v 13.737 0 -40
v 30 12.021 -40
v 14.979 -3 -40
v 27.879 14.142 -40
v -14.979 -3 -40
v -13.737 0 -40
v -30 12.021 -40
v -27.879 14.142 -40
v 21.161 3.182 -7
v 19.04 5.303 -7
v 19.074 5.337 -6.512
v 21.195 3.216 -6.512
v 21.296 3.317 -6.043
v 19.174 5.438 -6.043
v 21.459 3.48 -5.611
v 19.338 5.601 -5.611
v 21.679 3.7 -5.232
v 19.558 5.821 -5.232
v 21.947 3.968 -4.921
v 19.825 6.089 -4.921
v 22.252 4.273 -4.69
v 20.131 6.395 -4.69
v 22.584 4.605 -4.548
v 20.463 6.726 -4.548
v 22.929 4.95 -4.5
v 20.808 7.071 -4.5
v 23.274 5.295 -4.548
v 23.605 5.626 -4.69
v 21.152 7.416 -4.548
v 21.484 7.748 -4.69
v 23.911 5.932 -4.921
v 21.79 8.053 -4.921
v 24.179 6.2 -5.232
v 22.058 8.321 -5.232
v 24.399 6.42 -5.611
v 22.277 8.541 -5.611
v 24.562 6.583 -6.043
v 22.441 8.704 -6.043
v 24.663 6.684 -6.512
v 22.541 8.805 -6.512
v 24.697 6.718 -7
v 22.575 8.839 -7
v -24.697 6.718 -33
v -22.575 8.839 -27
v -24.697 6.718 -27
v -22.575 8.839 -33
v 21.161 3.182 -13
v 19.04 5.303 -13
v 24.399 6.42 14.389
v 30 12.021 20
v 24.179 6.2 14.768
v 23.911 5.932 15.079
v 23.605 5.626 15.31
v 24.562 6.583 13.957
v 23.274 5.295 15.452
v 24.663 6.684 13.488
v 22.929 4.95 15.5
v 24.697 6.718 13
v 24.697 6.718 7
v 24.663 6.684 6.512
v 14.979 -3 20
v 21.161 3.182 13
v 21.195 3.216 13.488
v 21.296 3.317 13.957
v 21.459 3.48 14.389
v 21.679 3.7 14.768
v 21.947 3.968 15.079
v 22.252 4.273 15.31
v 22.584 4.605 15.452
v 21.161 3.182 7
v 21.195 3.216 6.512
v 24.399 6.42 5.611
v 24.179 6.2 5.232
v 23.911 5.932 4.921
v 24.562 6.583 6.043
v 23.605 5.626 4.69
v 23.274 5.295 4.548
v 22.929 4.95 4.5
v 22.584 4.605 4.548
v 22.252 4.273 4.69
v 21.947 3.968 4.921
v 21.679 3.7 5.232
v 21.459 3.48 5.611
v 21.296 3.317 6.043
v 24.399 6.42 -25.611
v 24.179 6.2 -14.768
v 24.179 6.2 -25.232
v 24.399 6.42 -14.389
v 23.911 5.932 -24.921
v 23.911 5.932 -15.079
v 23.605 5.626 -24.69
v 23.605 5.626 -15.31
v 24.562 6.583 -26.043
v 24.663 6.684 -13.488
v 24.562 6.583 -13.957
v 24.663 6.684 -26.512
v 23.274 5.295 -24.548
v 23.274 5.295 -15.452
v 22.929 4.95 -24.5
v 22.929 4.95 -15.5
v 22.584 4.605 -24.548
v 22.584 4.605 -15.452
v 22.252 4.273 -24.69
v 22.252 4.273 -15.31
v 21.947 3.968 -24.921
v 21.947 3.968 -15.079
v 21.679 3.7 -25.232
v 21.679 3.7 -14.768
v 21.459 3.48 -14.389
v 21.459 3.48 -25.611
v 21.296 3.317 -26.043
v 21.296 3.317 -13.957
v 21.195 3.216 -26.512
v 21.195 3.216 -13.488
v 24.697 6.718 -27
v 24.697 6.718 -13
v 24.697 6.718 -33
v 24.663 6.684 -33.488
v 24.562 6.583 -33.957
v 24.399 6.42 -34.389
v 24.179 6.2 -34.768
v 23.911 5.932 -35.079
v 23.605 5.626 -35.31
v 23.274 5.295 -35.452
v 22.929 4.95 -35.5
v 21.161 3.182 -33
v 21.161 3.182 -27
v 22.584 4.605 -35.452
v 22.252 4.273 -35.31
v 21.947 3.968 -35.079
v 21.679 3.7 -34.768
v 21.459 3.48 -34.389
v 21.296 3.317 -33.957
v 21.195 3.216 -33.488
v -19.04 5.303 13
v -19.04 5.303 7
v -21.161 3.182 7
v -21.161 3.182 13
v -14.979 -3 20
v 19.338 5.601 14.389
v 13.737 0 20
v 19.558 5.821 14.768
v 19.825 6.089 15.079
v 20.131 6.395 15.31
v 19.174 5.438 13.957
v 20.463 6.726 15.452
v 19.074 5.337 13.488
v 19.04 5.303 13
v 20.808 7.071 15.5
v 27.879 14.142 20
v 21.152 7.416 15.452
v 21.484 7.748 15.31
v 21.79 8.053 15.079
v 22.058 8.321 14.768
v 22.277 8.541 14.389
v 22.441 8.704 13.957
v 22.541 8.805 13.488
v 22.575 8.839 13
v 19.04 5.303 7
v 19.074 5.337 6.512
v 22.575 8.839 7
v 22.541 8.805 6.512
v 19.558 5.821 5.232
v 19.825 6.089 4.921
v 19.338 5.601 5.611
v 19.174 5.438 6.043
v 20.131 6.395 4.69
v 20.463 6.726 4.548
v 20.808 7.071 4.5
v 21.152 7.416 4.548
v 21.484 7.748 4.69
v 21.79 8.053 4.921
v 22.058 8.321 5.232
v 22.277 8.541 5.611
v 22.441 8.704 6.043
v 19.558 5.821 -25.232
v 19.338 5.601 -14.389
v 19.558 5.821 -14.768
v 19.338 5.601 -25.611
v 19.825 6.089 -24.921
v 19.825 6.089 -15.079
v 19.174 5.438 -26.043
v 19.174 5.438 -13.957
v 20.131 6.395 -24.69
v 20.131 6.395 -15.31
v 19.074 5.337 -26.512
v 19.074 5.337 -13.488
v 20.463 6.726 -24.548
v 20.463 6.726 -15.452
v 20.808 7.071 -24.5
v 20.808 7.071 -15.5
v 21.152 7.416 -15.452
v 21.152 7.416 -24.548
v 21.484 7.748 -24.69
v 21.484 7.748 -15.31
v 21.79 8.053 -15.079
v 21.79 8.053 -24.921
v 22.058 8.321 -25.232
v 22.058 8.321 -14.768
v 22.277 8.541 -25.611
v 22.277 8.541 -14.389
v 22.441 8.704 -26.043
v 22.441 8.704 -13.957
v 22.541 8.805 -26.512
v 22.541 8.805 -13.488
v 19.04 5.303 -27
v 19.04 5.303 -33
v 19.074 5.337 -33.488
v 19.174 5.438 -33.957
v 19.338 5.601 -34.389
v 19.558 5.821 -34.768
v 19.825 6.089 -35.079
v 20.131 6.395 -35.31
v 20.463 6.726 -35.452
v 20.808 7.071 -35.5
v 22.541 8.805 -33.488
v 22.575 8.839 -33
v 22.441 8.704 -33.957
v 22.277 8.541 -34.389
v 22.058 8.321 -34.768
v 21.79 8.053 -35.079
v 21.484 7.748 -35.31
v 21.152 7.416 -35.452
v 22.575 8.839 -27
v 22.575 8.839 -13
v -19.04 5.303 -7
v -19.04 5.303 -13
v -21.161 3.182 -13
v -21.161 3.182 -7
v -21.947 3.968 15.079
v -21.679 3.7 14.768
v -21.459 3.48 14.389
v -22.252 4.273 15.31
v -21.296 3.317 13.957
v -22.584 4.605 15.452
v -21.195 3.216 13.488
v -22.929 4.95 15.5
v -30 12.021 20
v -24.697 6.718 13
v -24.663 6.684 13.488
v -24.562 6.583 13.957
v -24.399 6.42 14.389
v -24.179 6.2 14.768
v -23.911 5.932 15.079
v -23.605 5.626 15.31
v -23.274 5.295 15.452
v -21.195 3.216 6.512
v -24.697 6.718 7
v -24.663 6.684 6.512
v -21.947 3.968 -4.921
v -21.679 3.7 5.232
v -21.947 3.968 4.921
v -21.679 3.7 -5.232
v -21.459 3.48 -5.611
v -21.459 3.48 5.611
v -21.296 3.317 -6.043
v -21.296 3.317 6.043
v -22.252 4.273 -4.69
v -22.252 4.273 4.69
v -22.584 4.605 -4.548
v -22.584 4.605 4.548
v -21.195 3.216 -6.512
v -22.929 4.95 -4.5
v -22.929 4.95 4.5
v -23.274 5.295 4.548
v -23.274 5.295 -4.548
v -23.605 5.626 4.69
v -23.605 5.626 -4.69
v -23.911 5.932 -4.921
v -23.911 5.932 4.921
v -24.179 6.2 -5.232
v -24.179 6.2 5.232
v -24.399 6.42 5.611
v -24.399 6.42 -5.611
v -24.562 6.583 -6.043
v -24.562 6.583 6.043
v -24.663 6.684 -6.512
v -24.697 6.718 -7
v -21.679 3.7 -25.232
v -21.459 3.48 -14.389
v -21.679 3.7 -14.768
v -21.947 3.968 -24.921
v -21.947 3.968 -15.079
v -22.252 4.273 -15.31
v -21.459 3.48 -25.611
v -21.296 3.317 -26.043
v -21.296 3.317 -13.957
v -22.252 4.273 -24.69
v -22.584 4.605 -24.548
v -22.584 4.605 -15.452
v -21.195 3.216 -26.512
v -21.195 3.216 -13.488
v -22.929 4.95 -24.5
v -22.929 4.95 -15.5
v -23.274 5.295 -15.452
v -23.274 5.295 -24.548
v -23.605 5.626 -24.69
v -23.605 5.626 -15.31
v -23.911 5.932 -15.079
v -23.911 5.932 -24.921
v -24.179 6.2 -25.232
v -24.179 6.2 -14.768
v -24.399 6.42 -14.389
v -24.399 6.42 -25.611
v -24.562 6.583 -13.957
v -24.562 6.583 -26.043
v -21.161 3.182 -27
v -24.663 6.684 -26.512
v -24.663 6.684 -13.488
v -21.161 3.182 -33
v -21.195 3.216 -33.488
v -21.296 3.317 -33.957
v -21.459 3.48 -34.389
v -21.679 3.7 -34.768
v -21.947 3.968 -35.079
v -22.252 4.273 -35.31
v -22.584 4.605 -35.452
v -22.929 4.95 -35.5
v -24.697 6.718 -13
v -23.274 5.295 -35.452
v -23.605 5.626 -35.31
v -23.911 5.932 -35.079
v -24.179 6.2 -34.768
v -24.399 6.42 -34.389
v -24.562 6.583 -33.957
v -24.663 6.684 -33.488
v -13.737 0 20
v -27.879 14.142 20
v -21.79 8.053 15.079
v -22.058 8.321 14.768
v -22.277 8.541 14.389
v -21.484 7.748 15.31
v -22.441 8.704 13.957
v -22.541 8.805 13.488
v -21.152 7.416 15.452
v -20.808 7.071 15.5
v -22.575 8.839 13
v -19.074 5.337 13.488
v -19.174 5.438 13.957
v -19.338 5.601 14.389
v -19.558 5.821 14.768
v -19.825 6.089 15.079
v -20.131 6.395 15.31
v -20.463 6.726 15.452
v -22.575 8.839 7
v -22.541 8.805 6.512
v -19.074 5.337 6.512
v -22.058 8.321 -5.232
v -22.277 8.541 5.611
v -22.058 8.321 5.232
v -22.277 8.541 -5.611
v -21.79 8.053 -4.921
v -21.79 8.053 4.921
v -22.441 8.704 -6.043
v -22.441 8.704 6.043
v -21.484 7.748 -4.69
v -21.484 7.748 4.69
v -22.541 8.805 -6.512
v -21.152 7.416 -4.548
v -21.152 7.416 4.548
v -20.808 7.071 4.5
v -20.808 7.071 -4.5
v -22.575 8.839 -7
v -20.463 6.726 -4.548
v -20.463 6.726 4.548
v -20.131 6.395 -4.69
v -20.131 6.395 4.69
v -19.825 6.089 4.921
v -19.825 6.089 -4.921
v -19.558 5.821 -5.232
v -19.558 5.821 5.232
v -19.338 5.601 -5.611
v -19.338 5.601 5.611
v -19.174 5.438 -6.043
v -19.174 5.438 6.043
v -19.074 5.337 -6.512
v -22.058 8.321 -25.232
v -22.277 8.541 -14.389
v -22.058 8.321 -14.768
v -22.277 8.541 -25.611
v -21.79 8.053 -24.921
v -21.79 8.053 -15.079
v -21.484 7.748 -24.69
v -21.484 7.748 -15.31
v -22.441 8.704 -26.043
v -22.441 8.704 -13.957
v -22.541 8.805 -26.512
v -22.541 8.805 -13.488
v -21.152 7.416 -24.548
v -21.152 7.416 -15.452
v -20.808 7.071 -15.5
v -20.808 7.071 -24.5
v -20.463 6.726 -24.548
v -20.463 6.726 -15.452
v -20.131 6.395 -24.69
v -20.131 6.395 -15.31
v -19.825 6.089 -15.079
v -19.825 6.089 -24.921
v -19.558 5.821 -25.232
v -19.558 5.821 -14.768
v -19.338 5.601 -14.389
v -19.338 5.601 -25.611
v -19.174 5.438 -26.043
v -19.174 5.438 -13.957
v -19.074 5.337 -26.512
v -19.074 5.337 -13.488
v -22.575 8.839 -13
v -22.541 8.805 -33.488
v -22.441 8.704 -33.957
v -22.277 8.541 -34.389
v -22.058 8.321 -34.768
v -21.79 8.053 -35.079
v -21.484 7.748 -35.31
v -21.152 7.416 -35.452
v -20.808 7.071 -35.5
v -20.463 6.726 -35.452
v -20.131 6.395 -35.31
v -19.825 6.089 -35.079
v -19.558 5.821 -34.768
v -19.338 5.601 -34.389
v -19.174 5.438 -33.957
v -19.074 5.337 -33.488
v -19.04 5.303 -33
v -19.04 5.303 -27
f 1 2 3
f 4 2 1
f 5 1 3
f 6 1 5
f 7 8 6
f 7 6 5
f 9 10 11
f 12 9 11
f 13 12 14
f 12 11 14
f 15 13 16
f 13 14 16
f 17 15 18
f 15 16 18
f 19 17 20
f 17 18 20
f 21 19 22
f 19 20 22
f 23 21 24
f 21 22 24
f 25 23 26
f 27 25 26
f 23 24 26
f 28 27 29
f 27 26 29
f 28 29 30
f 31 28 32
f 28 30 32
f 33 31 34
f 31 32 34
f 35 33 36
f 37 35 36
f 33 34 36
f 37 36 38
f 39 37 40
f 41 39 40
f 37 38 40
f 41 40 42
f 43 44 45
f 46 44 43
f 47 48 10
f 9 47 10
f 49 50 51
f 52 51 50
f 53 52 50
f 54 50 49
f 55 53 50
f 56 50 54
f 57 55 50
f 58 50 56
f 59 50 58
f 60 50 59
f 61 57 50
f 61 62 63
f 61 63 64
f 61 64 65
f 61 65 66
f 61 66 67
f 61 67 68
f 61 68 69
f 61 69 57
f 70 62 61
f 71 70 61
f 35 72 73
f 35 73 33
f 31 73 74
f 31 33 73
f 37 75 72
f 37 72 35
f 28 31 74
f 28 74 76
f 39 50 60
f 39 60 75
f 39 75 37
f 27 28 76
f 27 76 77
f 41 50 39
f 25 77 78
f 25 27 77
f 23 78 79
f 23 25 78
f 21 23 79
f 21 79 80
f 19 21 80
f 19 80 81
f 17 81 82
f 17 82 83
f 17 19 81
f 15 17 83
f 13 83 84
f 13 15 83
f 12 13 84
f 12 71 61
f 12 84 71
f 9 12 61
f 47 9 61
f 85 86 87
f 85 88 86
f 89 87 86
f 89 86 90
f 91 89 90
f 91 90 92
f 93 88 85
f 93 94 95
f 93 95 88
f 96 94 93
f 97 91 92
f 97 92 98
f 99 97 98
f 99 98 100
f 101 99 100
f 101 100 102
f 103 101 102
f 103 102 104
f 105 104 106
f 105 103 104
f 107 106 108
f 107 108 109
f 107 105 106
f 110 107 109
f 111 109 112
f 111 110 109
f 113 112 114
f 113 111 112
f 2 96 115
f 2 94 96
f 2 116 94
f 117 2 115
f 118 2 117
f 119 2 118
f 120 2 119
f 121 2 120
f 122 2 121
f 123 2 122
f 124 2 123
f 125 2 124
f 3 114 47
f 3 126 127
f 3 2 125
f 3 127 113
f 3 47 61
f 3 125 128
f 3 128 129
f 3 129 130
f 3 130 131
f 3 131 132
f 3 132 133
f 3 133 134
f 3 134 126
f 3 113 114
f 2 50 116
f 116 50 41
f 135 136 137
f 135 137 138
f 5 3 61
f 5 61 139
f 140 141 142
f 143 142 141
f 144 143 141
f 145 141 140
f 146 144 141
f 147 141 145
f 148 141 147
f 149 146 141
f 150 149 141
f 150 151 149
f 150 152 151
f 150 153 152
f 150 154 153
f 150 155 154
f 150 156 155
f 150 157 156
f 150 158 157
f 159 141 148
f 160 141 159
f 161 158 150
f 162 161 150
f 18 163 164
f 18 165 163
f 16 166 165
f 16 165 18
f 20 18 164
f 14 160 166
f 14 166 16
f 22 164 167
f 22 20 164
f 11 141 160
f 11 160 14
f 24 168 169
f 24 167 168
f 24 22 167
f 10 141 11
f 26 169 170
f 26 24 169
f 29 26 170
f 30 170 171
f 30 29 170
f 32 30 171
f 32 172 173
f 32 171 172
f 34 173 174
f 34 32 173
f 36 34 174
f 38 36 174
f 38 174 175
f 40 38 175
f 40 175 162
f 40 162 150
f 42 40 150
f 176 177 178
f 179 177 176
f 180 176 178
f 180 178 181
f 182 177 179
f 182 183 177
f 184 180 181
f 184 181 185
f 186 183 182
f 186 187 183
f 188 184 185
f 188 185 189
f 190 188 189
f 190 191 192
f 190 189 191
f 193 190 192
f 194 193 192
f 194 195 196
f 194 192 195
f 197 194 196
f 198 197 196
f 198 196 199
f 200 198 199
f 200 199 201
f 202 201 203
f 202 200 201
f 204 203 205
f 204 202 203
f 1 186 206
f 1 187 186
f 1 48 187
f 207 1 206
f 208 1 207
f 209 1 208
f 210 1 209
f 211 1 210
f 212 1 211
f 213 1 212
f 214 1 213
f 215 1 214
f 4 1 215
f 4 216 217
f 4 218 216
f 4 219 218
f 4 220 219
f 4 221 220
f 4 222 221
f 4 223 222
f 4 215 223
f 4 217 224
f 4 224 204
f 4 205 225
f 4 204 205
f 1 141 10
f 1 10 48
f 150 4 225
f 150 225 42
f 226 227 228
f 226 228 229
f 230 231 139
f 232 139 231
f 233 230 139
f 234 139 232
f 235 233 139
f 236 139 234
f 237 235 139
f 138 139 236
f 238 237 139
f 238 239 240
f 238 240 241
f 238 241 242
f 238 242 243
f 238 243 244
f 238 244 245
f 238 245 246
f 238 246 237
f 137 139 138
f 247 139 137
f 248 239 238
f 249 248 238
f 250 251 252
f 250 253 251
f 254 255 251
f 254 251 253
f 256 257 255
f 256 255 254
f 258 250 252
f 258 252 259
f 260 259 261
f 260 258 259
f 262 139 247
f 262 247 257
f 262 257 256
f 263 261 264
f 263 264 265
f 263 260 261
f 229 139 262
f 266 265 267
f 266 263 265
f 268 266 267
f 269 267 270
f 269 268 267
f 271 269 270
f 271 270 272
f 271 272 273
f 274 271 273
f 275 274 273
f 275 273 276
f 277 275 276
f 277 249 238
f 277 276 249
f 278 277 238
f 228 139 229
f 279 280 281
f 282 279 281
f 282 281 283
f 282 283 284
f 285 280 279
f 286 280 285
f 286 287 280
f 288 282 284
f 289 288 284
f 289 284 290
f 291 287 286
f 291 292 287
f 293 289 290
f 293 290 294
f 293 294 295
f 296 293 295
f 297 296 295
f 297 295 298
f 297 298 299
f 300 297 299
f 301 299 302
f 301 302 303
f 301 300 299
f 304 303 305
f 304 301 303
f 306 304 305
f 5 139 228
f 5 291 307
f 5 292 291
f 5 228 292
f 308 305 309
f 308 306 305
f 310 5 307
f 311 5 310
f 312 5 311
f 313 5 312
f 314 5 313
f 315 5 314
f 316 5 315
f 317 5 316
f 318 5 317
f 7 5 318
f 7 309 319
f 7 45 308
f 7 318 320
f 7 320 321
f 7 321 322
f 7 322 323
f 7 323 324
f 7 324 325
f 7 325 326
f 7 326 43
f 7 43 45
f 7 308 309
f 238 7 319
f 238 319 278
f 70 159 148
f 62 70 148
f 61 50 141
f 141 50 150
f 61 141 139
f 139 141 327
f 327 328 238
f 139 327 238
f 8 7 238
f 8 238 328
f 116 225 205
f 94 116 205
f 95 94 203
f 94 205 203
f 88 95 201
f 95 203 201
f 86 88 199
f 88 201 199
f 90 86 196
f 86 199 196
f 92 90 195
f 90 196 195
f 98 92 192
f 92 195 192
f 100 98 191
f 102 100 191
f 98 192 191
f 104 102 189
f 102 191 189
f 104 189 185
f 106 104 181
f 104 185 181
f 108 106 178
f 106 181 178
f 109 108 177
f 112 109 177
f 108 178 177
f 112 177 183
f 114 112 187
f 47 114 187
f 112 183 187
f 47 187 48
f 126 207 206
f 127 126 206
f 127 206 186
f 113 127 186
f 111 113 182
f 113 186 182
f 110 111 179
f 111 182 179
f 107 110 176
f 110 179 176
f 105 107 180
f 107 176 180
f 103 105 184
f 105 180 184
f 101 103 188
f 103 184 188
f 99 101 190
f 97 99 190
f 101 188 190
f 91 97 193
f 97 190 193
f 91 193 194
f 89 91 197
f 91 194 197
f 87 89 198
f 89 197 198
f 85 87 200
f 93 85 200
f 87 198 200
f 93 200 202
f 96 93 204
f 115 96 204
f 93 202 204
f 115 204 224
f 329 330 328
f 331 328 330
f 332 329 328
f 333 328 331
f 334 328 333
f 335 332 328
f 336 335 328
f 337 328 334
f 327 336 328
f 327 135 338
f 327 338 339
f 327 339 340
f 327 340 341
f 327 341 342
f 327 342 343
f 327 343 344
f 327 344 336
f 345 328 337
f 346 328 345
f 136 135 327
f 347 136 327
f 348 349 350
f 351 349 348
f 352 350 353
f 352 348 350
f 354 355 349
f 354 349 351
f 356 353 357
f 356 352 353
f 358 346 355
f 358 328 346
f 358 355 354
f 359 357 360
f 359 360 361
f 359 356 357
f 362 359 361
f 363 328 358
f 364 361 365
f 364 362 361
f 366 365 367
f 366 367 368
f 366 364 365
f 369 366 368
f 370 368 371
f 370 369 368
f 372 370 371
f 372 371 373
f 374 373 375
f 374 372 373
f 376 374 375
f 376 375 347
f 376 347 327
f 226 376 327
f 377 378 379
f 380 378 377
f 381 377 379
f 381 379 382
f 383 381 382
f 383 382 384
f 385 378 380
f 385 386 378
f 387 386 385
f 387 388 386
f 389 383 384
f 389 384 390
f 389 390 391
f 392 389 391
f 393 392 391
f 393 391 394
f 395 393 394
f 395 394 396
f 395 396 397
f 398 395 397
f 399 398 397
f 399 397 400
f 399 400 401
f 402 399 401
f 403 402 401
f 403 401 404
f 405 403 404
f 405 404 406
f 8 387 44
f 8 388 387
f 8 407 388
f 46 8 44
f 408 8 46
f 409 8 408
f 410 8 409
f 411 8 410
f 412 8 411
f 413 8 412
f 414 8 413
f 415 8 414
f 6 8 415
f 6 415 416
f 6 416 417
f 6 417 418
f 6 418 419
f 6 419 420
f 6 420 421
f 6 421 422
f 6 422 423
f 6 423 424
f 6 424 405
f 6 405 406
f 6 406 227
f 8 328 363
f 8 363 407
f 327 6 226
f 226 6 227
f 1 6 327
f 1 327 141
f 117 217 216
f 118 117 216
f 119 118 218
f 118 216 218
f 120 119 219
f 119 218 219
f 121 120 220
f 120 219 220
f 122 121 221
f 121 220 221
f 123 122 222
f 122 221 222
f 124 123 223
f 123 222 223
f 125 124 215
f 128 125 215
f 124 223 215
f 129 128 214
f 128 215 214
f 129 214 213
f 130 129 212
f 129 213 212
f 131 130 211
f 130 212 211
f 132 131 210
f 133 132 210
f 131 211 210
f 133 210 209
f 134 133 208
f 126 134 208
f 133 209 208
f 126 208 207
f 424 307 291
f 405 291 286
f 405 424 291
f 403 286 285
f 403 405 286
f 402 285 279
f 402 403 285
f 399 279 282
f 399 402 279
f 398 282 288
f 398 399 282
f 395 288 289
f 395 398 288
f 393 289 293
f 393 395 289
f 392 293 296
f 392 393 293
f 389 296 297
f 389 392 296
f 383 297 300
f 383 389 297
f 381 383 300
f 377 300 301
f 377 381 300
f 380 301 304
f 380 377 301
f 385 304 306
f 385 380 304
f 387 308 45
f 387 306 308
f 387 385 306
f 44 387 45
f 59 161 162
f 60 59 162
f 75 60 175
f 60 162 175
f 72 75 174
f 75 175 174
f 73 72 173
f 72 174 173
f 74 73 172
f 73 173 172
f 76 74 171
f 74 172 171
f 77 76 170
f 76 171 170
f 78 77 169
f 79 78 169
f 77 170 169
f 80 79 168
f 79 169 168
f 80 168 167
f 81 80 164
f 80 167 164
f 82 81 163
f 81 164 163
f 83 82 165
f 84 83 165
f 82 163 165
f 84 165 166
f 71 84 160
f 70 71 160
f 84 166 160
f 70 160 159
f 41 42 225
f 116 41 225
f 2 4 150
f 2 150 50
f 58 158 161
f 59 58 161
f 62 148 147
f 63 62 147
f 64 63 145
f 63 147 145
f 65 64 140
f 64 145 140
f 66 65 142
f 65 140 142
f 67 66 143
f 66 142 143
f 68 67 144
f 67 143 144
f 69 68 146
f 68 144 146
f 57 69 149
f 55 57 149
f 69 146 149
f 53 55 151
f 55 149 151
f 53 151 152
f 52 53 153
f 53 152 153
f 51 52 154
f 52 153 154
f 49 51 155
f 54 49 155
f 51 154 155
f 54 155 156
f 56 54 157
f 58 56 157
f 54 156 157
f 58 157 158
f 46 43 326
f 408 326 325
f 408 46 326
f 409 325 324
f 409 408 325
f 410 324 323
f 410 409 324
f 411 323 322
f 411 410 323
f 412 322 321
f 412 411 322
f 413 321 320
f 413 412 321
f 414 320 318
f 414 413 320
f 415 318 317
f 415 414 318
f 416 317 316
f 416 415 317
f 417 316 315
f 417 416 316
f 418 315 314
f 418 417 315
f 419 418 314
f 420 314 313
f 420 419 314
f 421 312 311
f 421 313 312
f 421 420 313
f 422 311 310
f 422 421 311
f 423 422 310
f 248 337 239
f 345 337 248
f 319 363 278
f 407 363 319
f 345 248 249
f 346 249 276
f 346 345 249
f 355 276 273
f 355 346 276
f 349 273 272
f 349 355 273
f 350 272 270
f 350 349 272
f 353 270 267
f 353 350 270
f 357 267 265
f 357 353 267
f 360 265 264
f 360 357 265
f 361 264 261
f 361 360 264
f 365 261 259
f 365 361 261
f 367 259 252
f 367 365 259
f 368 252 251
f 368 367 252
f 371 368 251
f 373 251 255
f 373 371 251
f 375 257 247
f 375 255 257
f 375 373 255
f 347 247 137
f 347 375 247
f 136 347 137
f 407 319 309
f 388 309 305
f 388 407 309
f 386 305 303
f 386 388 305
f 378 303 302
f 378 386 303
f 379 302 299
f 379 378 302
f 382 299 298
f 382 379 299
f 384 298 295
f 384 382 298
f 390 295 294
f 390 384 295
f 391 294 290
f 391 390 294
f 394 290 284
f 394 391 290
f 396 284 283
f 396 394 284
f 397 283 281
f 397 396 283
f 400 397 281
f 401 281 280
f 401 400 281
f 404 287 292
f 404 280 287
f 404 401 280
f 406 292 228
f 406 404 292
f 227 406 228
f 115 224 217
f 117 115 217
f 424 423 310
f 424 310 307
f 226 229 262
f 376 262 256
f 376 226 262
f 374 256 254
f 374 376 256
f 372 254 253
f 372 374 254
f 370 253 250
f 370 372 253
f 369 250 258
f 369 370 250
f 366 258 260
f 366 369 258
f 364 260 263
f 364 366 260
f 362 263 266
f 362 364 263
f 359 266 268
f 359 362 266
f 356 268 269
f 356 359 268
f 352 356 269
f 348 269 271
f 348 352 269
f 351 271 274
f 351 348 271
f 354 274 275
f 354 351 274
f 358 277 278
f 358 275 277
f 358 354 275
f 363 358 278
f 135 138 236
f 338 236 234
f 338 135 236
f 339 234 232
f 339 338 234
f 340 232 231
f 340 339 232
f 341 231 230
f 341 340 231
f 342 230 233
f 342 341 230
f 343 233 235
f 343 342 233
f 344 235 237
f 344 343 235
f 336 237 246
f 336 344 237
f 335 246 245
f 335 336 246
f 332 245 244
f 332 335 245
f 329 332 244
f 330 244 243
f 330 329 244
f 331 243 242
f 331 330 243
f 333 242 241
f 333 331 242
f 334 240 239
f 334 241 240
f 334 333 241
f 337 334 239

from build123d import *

# Parameters (mm, degrees)
EXTRUDE_1_DEPTH        = 20
CUT_EXTRUDE_1_DEPTH    = 14.621320344
PATTERN_LINEAR_1_COUNT = 3
PATTERN_LINEAR_1_PITCH = 20


with BuildPart() as part:
    # Эскиз1 → Вытянуть-Тонкостенный1 (new body)
    with BuildSketch(Plane.XY):
        Polygon((-27.878679656, 14.142135624), (-13.736544033, 0), (13.736544033, 0), (27.878679656, 14.142135624), (30, 12.02081528), (14.97918472, -3), (-14.97918472, -3), (-30, 12.02081528), align=None)
    extrude(amount=EXTRUDE_1_DEPTH)

    # Эскиз2 → Вырез-Вытянуть1 (cut, through all)
    with BuildSketch(Plane(origin=(-6.868272016, -6.868272016, 0), x_dir=(0, 0, -1), z_dir=(0.707106781, 0.707106781, 0))):
        with BuildLine():
            Line((-7, 17.213203436), (-13, 17.213203436))
            ThreePointArc((-13, 17.213203436), (-15.5, 19.713203436), (-13, 22.213203436))
            Line((-13, 22.213203436), (-7, 22.213203436))
            ThreePointArc((-7, 22.213203436), (-4.5, 19.713203436), (-7, 17.213203436))
        make_face()
    cut_extrude_1 = extrude(amount=-CUT_EXTRUDE_1_DEPTH, mode=Mode.SUBTRACT)

    # Зеркальное отражение1: Вырез-Вытянуть1 across plane
    add(cut_extrude_1.mirror(Plane(origin=(0, 0, 0), x_dir=(0, 0, 1), z_dir=(1, 0, 0))), mode=Mode.SUBTRACT)


with BuildPart() as pattern_linear_1_1:
    # Линейный массив1: pattern copy
    add(part.part.moved(Location(Vector(0, 0, -1) * (1 * PATTERN_LINEAR_1_PITCH))))


with BuildPart() as pattern_linear_1_2:
    # Линейный массив1: pattern copy
    add(part.part.moved(Location(Vector(0, 0, -1) * (2 * PATTERN_LINEAR_1_PITCH))))


with BuildPart() as part_1:
    add(part.part)

    # Combine 2: union Линейный массив1_1, Линейный массив1_2
    add(pattern_linear_1_1.part)
    add(pattern_linear_1_2.part)


solid = part_1.part
